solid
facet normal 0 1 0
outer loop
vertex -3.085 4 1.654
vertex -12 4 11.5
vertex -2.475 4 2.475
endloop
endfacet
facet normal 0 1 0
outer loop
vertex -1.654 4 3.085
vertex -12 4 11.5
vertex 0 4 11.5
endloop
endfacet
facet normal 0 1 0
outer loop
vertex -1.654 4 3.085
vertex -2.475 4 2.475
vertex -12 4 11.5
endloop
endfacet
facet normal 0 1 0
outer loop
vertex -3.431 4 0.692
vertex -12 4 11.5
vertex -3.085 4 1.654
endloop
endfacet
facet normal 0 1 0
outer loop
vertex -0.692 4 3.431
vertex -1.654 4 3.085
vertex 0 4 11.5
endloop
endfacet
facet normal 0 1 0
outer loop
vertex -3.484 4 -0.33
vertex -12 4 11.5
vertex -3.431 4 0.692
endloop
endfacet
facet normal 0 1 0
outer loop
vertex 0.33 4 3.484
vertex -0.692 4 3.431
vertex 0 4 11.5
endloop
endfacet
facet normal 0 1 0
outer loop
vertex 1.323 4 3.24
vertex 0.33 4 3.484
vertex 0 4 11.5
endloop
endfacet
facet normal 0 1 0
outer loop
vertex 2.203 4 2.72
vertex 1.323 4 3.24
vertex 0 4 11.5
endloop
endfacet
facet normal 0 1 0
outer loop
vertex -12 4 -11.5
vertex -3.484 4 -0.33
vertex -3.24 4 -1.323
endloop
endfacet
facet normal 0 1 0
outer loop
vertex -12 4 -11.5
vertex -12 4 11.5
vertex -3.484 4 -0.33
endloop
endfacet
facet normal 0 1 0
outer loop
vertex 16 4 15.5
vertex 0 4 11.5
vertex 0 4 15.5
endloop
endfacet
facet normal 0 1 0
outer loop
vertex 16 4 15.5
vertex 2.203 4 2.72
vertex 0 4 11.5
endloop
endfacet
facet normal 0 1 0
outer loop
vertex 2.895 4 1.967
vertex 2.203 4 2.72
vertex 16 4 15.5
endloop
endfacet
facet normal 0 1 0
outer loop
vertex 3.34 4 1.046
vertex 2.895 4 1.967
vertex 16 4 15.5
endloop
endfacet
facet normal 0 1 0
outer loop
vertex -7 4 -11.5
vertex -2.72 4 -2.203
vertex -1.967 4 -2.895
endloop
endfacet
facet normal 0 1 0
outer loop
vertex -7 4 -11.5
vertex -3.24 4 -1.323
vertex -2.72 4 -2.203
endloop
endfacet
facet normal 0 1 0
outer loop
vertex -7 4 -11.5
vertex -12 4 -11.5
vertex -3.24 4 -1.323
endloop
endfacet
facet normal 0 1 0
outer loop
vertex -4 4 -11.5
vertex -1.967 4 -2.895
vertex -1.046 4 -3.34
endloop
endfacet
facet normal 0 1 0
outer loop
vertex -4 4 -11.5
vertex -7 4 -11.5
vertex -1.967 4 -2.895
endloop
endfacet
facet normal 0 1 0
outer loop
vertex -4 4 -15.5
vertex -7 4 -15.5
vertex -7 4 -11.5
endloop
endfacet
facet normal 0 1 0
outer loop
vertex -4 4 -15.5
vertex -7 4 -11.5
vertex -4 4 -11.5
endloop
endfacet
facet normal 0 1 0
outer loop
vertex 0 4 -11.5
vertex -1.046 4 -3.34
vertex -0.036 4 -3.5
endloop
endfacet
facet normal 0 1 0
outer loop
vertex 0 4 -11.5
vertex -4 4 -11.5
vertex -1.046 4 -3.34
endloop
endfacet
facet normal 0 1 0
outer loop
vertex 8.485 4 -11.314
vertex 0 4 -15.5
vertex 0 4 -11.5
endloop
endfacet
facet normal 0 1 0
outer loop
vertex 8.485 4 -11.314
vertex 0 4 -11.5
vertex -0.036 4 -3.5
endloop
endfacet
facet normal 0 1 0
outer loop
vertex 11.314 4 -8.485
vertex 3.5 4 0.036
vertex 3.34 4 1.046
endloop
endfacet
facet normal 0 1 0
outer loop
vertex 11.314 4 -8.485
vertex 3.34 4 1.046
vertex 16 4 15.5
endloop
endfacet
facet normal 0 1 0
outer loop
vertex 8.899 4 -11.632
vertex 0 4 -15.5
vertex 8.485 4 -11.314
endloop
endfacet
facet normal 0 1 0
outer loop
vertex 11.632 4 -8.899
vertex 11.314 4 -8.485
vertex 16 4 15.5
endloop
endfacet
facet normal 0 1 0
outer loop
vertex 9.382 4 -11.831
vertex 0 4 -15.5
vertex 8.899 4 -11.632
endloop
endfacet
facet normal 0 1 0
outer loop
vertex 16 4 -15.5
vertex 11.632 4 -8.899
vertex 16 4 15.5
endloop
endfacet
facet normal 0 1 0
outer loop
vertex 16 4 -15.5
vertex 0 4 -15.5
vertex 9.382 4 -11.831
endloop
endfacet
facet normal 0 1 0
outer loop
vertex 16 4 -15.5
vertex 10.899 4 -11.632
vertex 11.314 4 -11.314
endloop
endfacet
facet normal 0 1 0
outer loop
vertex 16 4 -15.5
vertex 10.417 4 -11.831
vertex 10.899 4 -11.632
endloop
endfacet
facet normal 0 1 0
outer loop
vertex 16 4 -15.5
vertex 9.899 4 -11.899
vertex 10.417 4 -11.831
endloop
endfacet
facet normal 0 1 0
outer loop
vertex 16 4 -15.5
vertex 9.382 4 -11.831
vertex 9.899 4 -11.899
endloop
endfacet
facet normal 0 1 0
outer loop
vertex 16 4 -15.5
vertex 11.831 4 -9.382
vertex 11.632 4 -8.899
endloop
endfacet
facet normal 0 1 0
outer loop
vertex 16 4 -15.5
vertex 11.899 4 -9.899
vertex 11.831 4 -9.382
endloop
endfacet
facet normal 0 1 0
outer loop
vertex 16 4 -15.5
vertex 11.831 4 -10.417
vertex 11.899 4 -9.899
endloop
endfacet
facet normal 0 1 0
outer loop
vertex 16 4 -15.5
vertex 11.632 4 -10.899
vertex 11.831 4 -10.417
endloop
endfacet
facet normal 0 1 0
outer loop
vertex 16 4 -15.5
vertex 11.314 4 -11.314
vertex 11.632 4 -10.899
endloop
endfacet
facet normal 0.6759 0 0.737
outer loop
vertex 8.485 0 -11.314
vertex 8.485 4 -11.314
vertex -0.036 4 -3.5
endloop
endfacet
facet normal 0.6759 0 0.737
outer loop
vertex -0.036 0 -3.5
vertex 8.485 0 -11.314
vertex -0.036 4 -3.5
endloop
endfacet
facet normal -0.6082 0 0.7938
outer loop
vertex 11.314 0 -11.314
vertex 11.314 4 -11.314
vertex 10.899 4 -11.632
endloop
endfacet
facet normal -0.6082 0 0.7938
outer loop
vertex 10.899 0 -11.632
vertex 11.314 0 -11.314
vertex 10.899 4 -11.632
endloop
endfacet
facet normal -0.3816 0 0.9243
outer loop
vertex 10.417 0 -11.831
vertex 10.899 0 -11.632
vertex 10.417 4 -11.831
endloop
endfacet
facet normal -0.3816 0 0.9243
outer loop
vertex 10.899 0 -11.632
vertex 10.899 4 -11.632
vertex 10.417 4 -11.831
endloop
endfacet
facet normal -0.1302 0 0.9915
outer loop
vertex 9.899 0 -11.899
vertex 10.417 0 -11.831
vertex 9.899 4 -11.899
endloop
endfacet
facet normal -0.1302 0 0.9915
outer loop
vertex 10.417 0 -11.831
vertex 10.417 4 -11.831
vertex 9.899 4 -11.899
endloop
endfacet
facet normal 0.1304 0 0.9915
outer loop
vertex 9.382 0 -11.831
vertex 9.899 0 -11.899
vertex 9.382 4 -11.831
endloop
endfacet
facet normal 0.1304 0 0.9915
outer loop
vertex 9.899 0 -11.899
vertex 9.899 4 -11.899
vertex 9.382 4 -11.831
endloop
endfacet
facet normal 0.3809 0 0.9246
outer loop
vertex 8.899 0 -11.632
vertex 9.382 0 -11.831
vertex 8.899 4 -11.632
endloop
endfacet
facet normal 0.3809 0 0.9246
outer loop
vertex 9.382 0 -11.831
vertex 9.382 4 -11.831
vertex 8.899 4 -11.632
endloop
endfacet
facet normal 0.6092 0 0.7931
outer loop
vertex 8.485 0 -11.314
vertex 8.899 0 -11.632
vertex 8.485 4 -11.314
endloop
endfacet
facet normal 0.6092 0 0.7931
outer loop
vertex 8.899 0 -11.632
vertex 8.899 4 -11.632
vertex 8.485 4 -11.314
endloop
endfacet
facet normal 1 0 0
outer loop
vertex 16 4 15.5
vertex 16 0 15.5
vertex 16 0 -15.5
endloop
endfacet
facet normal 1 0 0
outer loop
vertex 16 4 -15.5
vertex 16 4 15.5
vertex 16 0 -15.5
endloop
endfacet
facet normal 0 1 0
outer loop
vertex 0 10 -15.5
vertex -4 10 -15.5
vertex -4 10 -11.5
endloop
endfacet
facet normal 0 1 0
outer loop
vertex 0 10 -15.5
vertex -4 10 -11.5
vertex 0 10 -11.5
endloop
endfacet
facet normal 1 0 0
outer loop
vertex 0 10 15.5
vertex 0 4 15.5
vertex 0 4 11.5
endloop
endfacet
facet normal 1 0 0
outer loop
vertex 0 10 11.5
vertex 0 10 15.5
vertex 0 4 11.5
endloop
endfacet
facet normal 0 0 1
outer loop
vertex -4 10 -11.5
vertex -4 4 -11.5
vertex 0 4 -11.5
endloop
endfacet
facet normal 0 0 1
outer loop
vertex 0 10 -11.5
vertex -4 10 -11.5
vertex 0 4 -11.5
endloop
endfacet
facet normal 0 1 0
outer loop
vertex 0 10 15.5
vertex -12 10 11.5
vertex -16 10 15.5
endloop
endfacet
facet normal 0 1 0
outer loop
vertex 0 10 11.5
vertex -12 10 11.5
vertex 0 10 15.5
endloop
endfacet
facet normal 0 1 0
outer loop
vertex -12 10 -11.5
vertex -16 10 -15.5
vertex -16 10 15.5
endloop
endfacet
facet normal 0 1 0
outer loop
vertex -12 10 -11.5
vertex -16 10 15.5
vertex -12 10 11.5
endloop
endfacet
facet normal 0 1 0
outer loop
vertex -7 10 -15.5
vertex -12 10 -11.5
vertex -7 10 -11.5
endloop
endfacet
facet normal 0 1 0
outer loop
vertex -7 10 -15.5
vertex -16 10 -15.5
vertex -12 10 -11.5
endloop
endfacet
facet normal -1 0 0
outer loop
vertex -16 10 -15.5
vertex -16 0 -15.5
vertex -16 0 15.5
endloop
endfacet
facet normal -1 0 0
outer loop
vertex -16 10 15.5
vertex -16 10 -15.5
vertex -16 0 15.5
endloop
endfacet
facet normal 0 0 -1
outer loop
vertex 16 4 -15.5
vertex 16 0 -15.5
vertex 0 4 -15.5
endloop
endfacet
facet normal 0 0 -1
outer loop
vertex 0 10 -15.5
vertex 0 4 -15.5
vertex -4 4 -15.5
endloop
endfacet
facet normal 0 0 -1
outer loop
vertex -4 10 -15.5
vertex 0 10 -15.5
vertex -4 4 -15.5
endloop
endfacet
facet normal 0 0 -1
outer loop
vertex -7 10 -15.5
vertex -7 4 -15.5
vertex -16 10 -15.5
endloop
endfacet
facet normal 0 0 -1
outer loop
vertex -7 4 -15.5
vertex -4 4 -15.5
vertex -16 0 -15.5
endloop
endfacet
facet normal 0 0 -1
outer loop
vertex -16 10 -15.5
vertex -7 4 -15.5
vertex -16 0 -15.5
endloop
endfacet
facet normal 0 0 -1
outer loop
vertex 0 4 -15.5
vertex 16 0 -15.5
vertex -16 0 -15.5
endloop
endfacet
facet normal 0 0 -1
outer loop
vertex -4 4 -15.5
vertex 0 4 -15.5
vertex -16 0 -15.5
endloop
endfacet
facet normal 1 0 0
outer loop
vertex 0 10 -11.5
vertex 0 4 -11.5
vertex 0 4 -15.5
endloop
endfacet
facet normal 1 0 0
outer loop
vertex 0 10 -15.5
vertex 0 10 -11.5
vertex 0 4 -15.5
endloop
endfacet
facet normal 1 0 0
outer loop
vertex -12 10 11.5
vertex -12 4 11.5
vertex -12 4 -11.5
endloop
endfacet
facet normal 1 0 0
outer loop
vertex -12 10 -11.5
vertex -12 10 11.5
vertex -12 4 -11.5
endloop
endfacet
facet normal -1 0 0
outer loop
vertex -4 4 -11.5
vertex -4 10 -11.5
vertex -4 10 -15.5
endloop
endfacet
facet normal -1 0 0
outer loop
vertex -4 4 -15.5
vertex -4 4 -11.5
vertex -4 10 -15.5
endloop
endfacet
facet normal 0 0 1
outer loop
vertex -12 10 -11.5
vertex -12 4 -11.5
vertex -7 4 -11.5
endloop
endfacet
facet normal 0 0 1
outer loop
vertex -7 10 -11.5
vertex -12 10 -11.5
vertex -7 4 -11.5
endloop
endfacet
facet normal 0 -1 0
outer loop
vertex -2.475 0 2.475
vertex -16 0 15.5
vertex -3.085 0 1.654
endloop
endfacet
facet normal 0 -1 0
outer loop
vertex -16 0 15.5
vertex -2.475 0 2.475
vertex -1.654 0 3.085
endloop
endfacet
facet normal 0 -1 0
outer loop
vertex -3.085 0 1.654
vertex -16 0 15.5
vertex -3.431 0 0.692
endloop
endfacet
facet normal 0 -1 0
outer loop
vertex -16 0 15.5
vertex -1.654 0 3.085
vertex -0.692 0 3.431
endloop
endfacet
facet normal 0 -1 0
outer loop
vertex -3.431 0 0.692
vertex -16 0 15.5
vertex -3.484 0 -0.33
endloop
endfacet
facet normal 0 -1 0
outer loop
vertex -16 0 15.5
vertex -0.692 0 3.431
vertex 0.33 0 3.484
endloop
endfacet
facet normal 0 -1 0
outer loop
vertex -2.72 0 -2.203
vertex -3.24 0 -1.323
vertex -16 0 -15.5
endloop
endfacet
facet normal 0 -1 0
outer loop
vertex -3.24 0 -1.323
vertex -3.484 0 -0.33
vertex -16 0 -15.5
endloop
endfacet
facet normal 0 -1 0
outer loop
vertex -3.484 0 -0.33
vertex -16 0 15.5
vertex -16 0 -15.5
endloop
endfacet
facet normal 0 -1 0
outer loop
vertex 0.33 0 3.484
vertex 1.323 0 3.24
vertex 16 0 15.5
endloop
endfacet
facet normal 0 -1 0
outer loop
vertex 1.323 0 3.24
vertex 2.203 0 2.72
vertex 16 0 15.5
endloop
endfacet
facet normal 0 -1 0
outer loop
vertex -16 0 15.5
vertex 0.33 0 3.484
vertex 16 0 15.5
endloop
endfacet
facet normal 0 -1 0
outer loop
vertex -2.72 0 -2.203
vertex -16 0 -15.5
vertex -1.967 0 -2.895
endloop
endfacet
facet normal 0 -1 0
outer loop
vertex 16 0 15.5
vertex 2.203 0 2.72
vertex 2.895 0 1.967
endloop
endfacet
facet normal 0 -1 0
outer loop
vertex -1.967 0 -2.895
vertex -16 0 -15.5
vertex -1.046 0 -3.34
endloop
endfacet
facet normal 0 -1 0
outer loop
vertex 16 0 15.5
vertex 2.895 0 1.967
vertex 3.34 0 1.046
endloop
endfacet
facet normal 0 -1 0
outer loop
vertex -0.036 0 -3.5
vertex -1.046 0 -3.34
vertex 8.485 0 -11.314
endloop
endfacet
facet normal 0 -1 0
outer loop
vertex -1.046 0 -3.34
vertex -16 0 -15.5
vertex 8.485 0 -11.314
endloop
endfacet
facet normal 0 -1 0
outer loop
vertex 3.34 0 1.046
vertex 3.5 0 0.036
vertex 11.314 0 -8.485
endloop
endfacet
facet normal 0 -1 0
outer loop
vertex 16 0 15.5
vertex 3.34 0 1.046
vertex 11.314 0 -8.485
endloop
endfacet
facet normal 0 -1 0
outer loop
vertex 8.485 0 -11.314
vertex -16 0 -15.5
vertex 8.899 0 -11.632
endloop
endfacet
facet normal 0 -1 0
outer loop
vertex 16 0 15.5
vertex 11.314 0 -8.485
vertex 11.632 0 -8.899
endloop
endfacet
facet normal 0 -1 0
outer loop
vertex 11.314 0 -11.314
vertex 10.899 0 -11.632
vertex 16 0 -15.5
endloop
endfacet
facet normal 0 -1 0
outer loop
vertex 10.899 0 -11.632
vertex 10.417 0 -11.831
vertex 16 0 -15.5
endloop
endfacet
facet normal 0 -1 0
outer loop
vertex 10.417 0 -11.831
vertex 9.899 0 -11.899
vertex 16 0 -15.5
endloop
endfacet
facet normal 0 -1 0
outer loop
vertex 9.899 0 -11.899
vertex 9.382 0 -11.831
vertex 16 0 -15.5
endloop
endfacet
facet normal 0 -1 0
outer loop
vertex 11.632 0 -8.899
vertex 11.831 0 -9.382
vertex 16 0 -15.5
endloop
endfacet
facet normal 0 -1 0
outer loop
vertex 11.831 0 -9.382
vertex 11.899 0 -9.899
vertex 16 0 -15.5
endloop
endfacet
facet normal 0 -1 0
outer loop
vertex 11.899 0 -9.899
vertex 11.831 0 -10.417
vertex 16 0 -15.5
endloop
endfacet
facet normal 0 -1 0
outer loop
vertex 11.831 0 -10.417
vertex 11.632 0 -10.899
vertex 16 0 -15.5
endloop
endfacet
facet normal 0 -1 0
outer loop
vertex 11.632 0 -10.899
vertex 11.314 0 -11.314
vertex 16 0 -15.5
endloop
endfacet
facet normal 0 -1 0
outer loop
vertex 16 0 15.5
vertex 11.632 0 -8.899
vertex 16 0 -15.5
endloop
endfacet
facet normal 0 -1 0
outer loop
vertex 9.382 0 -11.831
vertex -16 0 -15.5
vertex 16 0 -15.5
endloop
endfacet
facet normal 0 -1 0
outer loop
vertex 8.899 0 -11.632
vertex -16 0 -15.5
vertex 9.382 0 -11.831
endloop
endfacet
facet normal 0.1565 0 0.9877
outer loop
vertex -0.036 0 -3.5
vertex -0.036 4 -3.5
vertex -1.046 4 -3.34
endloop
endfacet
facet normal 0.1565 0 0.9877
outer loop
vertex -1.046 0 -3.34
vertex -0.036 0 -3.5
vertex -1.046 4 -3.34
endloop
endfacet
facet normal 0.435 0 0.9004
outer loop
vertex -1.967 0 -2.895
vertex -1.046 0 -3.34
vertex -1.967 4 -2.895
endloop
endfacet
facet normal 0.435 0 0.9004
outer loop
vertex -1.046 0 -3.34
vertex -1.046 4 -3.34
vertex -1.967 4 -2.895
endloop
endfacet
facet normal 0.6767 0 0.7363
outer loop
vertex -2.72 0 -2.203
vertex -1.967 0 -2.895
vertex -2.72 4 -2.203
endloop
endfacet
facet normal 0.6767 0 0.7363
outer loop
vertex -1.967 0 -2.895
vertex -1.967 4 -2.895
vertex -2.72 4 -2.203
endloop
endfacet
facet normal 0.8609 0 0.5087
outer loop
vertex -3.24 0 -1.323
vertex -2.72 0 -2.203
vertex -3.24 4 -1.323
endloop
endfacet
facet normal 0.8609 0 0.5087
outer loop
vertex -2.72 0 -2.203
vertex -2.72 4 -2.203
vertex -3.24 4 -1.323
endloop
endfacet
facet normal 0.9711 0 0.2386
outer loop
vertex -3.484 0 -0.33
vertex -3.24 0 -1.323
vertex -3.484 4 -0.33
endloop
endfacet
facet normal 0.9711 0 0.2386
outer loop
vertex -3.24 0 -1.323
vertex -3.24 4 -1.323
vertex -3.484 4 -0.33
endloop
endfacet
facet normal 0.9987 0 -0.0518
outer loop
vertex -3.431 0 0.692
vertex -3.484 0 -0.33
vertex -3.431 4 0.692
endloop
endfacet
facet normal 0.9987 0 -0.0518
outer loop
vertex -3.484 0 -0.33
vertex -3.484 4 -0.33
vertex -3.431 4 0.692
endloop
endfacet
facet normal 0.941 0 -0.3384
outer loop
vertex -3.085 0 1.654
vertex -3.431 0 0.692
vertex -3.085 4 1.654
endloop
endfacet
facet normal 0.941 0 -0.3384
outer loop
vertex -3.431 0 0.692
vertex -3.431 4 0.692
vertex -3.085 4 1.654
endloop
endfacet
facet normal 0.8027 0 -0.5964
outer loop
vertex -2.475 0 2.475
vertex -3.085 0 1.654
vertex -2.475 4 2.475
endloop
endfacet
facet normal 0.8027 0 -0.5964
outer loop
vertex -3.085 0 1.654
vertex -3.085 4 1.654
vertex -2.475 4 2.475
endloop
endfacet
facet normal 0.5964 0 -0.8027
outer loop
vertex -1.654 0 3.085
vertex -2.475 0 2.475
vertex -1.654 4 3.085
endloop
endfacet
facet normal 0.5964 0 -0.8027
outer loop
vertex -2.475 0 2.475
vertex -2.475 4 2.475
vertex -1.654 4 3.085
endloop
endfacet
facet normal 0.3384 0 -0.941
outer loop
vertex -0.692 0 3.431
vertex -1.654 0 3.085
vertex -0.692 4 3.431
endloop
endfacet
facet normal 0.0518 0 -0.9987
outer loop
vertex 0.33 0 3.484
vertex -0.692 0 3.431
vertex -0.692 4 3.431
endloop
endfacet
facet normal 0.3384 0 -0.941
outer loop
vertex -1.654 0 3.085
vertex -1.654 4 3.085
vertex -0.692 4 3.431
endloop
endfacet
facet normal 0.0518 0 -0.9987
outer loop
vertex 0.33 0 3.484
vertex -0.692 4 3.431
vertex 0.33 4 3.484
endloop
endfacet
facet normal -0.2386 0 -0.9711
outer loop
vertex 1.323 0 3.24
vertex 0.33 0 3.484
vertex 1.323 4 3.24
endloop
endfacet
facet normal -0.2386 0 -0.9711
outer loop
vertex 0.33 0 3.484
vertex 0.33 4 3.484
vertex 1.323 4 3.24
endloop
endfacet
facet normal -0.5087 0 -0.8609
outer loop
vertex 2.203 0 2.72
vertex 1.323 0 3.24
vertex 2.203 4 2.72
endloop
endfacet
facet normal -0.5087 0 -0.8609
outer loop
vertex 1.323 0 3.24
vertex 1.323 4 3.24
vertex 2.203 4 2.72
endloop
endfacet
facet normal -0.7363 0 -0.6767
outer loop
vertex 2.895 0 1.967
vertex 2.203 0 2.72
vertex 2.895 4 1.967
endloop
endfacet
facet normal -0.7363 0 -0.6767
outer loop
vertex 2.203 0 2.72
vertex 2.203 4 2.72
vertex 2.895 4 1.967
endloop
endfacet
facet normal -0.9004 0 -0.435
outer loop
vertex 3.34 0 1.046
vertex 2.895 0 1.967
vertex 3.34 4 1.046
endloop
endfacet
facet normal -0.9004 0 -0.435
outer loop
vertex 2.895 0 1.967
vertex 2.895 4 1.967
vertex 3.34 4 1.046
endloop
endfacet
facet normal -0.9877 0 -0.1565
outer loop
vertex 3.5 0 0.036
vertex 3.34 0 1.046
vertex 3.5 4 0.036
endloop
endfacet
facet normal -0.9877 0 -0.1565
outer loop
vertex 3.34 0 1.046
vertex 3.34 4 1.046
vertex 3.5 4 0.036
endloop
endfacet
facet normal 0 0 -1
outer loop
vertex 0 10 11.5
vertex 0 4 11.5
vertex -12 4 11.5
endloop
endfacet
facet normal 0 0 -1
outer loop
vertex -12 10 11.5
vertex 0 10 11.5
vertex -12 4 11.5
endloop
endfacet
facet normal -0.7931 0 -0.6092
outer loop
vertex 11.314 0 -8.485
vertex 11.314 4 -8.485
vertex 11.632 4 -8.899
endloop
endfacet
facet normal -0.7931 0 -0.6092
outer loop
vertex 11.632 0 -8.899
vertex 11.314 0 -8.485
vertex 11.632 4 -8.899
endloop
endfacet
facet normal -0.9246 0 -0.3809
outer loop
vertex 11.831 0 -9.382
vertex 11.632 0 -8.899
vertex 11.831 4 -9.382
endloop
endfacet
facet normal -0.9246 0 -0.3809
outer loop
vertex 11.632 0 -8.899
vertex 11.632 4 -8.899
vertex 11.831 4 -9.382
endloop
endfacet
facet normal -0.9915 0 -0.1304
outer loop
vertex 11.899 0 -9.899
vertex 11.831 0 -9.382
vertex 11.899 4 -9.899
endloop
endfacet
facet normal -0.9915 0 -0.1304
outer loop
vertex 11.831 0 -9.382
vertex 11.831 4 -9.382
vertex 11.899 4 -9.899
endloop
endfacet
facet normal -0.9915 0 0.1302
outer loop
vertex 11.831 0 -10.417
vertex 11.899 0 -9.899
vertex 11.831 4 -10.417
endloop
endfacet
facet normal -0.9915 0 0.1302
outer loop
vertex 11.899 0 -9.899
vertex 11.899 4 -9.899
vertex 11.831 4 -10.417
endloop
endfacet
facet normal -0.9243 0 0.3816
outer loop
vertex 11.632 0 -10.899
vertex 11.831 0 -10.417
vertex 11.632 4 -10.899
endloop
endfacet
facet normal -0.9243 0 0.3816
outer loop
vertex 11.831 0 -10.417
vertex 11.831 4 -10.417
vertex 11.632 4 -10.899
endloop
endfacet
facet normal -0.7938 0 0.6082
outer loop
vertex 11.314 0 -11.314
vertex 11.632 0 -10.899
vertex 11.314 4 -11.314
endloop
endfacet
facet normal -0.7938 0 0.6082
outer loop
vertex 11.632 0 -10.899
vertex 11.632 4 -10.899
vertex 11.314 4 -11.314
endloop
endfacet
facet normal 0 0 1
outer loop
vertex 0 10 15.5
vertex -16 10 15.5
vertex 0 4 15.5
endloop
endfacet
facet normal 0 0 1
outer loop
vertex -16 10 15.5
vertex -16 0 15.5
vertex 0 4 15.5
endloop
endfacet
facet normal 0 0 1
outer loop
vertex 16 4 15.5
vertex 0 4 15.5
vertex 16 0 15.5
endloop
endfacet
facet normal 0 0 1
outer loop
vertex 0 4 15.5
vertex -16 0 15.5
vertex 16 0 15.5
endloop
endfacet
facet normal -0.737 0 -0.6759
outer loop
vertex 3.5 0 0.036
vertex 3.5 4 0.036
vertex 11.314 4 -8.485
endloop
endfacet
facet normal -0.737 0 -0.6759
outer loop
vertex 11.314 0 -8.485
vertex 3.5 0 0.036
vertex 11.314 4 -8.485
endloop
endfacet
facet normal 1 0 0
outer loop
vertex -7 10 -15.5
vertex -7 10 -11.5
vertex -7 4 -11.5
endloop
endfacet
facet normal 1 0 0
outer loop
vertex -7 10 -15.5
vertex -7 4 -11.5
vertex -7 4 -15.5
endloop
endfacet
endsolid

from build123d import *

# Parameters (mm, degrees)
SKETCH1_W           = 32
SKETCH1_H           = 31
BOSS_EXTRUDE1_DEPTH = 4
BOSS_EXTRUDE2_DEPTH = 6
SKETCH3_W           = 3
SKETCH3_H           = 4
CUT_EXTRUDE1_DEPTH  = 6
CUT_EXTRUDE6_DEPTH  = 4


with BuildPart() as part:
    # Sketch1 → Boss-Extrude1 (new body)
    with BuildSketch(Plane(origin=(0, 0, 0), x_dir=(1, 0, 0), z_dir=(0, 1, 0))):
        Rectangle(SKETCH1_W, SKETCH1_H)
    extrude(amount=BOSS_EXTRUDE1_DEPTH)

    # Sketch2 → Boss-Extrude2 (add)
    with BuildSketch(Plane(origin=(0, 4, 0), x_dir=(1, 0, 0), z_dir=(0, 1, 0))):
        Polygon((-16, 15.5), (-16, -15.5), (0, -15.5), (0, -11.5), (-12, -11.5), (-12, 11.5), (0, 11.5), (0, 15.5), align=None)
    extrude(amount=BOSS_EXTRUDE2_DEPTH)

    # Sketch3 → Cut-Extrude1 (cut)
    with BuildSketch(Plane(origin=(0, 10, 0), x_dir=(1, 0, 0), z_dir=(0, 1, 0))):
        with Locations((-5.5, 13.5)):
            Rectangle(SKETCH3_W, SKETCH3_H)
    extrude(amount=-CUT_EXTRUDE1_DEPTH, mode=Mode.SUBTRACT)

    # Sketch4 → Cut-Extrude6 (cut)
    with BuildSketch(Plane(origin=(0, 4, 0), x_dir=(0.7071067811864886, 0, -0.7071067811866065), z_dir=(0, 1, 0))):
        with BuildLine():
            Line((14, 2), (2.449489743, 2.5))
            ThreePointArc((2.449489743, 2.5), (3.226702194, 1.355873501), (3.5, 0))
            ThreePointArc((3.5, 0), (3.226702194, -1.355873501), (2.449489743, -2.5))
            Line((2.449489743, -2.5), (14, -2))
            ThreePointArc((14, -2), (15.414213562, -1.414213562), (16, 0))
            ThreePointArc((16, 0), (15.414213562, 1.414213562), (14, 2))
        make_face()
        with BuildLine():
            ThreePointArc((3.5, 0), (3.226702194, 1.355873501), (2.449489743, 2.5))
            ThreePointArc((2.449489743, 2.5), (-3.5, 0), (2.449489743, -2.5))
            ThreePointArc((2.449489743, -2.5), (3.226702194, -1.355873501), (3.5, 0))
        make_face()
    extrude(amount=-CUT_EXTRUDE6_DEPTH, mode=Mode.SUBTRACT)


solid = part.part
